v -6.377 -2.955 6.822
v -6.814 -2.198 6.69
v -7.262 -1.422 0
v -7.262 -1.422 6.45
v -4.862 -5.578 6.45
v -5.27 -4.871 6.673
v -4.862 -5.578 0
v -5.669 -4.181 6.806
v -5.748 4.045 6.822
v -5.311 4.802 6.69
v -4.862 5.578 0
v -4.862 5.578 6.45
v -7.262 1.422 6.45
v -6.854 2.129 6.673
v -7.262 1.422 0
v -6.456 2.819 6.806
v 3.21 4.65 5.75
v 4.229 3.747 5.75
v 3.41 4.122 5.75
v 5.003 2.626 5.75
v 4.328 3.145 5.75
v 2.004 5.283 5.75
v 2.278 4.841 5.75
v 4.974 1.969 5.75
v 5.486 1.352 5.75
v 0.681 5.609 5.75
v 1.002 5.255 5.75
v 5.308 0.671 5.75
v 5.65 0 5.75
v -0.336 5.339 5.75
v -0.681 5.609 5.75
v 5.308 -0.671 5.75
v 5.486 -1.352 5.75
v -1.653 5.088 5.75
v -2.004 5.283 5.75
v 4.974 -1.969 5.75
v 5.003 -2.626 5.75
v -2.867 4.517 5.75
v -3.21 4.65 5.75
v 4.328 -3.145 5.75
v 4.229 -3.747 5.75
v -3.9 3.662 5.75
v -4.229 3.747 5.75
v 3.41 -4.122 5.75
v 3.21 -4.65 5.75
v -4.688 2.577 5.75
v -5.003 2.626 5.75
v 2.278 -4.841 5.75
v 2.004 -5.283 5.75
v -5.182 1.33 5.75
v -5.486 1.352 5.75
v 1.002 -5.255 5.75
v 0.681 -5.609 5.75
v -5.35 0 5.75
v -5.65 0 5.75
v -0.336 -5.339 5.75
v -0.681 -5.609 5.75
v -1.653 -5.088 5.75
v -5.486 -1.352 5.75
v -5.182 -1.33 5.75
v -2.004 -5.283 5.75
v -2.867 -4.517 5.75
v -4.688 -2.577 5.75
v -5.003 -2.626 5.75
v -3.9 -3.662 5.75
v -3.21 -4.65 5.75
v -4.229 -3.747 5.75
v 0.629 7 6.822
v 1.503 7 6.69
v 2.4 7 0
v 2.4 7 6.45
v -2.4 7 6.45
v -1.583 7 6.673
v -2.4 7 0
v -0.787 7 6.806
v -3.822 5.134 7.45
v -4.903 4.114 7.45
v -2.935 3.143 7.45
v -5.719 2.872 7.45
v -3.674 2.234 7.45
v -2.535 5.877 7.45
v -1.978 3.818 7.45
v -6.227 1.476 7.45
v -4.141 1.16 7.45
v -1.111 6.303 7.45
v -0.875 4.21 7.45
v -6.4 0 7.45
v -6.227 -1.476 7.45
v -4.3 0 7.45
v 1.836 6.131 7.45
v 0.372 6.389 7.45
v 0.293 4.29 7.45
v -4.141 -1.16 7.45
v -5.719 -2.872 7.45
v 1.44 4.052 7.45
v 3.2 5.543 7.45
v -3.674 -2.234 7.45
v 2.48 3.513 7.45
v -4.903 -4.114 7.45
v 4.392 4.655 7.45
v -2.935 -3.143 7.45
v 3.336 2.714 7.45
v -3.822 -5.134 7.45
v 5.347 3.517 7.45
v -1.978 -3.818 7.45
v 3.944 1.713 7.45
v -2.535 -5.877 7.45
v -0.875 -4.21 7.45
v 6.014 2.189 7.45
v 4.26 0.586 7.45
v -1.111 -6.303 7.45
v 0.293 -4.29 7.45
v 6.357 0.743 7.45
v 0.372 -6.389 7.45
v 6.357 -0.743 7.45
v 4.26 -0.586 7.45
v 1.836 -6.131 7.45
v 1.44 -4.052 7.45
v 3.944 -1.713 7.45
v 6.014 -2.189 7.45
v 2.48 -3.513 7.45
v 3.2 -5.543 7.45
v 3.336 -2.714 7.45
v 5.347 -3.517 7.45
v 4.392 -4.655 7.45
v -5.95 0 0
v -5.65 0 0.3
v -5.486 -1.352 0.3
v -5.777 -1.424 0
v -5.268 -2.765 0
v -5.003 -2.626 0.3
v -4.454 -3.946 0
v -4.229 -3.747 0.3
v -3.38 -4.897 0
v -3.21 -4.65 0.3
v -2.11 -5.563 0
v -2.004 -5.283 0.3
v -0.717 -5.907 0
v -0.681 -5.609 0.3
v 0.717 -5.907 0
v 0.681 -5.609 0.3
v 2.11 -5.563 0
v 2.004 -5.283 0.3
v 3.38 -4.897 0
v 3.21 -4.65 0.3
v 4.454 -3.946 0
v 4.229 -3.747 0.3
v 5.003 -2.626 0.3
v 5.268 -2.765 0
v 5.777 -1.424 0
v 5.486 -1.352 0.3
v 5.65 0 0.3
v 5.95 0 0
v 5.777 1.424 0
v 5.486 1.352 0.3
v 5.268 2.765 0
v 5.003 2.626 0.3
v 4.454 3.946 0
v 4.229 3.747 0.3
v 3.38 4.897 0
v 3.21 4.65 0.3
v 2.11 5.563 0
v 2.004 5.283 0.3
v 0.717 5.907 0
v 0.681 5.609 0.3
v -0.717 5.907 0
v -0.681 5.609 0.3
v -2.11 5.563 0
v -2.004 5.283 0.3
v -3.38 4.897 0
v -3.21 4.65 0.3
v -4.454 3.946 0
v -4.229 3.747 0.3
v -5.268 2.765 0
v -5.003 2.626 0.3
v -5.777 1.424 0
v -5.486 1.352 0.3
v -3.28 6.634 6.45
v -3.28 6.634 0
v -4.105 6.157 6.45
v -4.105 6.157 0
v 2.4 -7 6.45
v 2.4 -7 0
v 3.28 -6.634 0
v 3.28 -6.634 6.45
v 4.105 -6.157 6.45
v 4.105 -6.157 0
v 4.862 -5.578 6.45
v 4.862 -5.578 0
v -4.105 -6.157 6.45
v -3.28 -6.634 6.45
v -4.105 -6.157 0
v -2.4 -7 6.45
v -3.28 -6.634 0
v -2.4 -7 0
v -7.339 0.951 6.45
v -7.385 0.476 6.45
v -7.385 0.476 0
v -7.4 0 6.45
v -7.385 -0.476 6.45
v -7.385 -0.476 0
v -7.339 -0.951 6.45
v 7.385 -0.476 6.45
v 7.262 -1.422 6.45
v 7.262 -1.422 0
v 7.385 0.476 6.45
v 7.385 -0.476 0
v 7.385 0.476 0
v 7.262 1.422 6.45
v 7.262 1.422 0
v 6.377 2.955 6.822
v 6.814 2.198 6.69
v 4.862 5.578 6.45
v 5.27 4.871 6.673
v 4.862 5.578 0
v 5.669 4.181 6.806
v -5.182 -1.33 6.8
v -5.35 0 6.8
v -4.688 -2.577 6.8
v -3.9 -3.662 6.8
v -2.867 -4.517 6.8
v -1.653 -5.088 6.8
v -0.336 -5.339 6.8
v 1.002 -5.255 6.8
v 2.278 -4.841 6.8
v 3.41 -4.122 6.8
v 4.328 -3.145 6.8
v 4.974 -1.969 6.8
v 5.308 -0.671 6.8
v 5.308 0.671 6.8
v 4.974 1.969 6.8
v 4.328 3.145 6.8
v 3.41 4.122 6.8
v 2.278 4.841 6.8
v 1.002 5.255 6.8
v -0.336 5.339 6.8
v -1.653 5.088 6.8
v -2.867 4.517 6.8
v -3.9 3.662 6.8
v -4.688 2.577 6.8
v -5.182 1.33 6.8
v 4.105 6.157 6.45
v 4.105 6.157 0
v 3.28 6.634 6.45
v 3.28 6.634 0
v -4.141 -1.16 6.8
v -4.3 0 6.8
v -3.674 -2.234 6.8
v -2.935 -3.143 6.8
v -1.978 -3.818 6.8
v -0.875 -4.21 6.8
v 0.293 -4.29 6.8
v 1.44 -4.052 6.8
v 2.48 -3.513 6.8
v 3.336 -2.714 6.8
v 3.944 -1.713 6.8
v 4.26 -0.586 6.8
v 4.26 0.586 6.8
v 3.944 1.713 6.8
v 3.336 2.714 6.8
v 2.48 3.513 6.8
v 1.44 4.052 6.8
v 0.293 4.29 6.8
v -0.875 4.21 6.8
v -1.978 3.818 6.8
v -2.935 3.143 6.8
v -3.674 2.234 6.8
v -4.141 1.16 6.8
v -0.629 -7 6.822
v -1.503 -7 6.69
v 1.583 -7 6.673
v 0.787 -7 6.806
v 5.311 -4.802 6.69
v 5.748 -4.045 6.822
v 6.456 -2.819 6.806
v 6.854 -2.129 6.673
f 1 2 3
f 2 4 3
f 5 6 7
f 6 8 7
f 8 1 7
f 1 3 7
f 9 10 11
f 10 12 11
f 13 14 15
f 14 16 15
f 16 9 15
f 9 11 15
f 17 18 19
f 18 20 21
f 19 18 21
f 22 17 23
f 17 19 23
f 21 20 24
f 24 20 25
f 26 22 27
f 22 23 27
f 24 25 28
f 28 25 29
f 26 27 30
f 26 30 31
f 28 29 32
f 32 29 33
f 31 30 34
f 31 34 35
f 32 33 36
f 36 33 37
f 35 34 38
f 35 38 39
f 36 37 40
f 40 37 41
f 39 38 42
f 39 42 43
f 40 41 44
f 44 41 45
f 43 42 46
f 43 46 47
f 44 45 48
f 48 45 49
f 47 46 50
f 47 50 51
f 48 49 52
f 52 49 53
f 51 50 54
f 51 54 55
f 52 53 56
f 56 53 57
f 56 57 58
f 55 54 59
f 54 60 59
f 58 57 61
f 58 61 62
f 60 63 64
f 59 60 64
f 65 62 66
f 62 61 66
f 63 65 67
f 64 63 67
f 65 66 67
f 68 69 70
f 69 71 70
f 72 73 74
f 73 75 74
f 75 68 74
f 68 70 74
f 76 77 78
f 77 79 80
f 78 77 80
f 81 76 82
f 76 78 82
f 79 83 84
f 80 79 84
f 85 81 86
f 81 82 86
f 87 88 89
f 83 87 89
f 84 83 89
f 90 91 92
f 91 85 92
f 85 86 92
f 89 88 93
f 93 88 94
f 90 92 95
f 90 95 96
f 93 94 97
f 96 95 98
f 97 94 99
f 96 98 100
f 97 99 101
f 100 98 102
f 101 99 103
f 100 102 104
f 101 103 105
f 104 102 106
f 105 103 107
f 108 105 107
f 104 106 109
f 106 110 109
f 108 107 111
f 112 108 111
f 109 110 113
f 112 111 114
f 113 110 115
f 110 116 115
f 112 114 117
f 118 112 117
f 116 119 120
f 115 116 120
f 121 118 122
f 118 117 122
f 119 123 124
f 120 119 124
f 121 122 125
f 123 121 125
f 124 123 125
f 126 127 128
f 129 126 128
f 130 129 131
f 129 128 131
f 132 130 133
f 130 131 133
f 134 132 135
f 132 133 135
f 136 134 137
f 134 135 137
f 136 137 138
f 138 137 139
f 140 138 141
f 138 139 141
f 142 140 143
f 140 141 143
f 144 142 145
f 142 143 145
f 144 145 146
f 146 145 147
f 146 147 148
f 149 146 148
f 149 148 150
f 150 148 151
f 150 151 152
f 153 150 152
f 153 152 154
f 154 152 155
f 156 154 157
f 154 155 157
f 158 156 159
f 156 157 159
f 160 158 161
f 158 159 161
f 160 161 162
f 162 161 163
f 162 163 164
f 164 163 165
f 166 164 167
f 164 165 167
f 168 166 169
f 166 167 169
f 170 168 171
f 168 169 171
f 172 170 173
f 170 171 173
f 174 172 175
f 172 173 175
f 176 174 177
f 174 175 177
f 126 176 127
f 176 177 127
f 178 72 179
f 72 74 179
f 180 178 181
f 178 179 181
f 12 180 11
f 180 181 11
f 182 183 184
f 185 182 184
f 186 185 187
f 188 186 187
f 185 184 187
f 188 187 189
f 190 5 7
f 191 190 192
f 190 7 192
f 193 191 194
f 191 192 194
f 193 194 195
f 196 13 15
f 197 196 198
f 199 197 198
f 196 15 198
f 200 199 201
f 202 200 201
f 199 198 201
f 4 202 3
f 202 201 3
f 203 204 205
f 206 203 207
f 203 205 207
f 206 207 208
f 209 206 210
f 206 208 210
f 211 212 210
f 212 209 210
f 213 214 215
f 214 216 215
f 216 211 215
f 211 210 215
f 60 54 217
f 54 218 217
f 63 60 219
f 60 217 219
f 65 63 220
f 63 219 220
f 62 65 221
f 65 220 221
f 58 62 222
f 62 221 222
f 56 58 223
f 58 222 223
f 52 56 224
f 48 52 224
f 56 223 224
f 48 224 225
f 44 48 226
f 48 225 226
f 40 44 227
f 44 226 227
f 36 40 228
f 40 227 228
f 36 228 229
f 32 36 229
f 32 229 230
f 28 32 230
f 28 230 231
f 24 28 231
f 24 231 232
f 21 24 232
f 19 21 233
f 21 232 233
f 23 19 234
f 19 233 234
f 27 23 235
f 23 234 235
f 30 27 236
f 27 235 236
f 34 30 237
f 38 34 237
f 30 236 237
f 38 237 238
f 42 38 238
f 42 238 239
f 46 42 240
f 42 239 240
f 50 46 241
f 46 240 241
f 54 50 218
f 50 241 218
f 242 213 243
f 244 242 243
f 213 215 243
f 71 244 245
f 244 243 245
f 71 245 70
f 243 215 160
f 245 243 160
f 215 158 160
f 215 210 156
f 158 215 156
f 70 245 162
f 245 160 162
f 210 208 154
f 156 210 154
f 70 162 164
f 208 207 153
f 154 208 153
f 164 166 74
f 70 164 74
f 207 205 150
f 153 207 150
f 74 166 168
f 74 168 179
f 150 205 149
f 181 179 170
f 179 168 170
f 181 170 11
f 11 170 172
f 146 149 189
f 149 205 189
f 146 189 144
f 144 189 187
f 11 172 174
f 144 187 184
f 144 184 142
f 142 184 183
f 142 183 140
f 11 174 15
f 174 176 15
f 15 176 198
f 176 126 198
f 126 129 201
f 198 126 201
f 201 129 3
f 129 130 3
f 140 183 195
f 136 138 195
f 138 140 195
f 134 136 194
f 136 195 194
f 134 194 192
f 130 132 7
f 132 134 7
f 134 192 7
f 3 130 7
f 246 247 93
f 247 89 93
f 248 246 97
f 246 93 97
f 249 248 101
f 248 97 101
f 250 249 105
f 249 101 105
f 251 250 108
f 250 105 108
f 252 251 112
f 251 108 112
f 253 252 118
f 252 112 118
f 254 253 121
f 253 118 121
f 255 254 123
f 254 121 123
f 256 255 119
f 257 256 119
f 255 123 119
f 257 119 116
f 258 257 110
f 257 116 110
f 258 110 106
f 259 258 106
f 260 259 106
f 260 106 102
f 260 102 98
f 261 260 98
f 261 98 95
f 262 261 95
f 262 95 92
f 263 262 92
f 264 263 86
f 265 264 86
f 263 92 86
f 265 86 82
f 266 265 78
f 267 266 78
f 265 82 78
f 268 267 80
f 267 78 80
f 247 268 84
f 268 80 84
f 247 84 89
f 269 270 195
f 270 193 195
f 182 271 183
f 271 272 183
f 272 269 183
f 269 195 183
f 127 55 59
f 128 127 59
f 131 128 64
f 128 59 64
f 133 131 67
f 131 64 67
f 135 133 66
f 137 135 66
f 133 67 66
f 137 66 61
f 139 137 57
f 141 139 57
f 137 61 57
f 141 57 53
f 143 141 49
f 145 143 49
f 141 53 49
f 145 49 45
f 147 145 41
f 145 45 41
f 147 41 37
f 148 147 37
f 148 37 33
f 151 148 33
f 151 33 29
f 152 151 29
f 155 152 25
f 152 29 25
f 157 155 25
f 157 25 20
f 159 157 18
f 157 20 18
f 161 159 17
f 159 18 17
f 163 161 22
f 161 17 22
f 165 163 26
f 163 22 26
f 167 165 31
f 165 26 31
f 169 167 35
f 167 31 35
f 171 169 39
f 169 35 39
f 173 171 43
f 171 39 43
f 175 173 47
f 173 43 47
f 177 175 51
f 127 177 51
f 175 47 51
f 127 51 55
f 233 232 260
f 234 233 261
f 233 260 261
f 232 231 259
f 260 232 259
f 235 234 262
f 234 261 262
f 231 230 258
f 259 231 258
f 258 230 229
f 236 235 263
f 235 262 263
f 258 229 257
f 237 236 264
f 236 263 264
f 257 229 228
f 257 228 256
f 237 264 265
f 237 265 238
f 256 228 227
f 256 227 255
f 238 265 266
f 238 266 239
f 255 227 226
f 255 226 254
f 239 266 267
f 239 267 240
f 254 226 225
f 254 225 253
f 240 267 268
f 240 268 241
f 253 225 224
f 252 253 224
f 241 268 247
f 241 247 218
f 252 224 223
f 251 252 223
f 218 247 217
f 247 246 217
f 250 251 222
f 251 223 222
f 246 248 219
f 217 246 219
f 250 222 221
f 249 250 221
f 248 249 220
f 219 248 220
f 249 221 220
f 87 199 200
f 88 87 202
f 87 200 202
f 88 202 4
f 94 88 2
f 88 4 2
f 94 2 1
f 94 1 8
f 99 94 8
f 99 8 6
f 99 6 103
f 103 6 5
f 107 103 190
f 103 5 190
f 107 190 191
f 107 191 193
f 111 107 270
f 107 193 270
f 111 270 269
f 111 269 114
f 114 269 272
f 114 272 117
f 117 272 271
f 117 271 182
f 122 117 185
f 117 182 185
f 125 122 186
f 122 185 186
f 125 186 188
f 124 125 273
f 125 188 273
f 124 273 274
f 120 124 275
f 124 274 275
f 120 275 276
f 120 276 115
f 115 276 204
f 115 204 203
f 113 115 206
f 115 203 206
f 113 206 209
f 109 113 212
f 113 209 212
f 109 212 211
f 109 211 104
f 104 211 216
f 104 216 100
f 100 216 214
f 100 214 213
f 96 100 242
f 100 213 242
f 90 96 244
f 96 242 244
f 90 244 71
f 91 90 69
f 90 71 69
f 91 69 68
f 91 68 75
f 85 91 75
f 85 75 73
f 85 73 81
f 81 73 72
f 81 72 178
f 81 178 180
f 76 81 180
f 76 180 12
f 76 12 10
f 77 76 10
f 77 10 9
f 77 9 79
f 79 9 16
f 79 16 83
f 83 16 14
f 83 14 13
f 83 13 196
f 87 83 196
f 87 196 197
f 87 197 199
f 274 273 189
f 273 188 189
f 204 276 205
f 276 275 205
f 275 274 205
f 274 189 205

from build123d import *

# Parameters (mm, degrees)
SKETCH_2_R          = 10
CUT_EXTRUDE_2_DEPTH = 13.84610836
CHAMFER_1_SIZE      = 0.3


with BuildPart() as part:
    # Эскиз1 → Повернуть1 (revolve)
    with BuildSketch(Plane(origin=(0, 0, 0), x_dir=(1, 0, 0), z_dir=(0, 1, 0)), mode=Mode.PRIVATE) as revolve_1_sk:
        Polygon((4.3, -7.45), (6.4, -7.45), (7.4, -6.45), (7.4, 0), (5.65, 0), (5.65, -5.75), (5.35, -5.75), (5.35, -6.8), (4.3, -6.8), align=None)
    revolve(revolve_1_sk.sketch.rotate(Axis((0, 0, 0), (0, 0, 1)), 180), axis=Axis((0, 0, 0), (0, 0, 1)))

    # Эскиз2 → Вырез-Вытянуть2 (cut, through all)
    with BuildSketch(Plane.XY):
        Circle(SKETCH_2_R)
        Polygon((8.082903769, 0), (4.041451884, 7), (-4.041451884, 7), (-8.082903769, 0), (-4.041451884, -7), (4.041451884, -7), align=None, mode=Mode.SUBTRACT)
    extrude(amount=CUT_EXTRUDE_2_DEPTH, mode=Mode.SUBTRACT)

    # Фаска1
    chamfer_1_edges = [part.edges().sort_by_distance(p)[0] for p in [
        (5.65, 0, 0),
    ]]
    chamfer(chamfer_1_edges, length=CHAMFER_1_SIZE)


solid = part.part
